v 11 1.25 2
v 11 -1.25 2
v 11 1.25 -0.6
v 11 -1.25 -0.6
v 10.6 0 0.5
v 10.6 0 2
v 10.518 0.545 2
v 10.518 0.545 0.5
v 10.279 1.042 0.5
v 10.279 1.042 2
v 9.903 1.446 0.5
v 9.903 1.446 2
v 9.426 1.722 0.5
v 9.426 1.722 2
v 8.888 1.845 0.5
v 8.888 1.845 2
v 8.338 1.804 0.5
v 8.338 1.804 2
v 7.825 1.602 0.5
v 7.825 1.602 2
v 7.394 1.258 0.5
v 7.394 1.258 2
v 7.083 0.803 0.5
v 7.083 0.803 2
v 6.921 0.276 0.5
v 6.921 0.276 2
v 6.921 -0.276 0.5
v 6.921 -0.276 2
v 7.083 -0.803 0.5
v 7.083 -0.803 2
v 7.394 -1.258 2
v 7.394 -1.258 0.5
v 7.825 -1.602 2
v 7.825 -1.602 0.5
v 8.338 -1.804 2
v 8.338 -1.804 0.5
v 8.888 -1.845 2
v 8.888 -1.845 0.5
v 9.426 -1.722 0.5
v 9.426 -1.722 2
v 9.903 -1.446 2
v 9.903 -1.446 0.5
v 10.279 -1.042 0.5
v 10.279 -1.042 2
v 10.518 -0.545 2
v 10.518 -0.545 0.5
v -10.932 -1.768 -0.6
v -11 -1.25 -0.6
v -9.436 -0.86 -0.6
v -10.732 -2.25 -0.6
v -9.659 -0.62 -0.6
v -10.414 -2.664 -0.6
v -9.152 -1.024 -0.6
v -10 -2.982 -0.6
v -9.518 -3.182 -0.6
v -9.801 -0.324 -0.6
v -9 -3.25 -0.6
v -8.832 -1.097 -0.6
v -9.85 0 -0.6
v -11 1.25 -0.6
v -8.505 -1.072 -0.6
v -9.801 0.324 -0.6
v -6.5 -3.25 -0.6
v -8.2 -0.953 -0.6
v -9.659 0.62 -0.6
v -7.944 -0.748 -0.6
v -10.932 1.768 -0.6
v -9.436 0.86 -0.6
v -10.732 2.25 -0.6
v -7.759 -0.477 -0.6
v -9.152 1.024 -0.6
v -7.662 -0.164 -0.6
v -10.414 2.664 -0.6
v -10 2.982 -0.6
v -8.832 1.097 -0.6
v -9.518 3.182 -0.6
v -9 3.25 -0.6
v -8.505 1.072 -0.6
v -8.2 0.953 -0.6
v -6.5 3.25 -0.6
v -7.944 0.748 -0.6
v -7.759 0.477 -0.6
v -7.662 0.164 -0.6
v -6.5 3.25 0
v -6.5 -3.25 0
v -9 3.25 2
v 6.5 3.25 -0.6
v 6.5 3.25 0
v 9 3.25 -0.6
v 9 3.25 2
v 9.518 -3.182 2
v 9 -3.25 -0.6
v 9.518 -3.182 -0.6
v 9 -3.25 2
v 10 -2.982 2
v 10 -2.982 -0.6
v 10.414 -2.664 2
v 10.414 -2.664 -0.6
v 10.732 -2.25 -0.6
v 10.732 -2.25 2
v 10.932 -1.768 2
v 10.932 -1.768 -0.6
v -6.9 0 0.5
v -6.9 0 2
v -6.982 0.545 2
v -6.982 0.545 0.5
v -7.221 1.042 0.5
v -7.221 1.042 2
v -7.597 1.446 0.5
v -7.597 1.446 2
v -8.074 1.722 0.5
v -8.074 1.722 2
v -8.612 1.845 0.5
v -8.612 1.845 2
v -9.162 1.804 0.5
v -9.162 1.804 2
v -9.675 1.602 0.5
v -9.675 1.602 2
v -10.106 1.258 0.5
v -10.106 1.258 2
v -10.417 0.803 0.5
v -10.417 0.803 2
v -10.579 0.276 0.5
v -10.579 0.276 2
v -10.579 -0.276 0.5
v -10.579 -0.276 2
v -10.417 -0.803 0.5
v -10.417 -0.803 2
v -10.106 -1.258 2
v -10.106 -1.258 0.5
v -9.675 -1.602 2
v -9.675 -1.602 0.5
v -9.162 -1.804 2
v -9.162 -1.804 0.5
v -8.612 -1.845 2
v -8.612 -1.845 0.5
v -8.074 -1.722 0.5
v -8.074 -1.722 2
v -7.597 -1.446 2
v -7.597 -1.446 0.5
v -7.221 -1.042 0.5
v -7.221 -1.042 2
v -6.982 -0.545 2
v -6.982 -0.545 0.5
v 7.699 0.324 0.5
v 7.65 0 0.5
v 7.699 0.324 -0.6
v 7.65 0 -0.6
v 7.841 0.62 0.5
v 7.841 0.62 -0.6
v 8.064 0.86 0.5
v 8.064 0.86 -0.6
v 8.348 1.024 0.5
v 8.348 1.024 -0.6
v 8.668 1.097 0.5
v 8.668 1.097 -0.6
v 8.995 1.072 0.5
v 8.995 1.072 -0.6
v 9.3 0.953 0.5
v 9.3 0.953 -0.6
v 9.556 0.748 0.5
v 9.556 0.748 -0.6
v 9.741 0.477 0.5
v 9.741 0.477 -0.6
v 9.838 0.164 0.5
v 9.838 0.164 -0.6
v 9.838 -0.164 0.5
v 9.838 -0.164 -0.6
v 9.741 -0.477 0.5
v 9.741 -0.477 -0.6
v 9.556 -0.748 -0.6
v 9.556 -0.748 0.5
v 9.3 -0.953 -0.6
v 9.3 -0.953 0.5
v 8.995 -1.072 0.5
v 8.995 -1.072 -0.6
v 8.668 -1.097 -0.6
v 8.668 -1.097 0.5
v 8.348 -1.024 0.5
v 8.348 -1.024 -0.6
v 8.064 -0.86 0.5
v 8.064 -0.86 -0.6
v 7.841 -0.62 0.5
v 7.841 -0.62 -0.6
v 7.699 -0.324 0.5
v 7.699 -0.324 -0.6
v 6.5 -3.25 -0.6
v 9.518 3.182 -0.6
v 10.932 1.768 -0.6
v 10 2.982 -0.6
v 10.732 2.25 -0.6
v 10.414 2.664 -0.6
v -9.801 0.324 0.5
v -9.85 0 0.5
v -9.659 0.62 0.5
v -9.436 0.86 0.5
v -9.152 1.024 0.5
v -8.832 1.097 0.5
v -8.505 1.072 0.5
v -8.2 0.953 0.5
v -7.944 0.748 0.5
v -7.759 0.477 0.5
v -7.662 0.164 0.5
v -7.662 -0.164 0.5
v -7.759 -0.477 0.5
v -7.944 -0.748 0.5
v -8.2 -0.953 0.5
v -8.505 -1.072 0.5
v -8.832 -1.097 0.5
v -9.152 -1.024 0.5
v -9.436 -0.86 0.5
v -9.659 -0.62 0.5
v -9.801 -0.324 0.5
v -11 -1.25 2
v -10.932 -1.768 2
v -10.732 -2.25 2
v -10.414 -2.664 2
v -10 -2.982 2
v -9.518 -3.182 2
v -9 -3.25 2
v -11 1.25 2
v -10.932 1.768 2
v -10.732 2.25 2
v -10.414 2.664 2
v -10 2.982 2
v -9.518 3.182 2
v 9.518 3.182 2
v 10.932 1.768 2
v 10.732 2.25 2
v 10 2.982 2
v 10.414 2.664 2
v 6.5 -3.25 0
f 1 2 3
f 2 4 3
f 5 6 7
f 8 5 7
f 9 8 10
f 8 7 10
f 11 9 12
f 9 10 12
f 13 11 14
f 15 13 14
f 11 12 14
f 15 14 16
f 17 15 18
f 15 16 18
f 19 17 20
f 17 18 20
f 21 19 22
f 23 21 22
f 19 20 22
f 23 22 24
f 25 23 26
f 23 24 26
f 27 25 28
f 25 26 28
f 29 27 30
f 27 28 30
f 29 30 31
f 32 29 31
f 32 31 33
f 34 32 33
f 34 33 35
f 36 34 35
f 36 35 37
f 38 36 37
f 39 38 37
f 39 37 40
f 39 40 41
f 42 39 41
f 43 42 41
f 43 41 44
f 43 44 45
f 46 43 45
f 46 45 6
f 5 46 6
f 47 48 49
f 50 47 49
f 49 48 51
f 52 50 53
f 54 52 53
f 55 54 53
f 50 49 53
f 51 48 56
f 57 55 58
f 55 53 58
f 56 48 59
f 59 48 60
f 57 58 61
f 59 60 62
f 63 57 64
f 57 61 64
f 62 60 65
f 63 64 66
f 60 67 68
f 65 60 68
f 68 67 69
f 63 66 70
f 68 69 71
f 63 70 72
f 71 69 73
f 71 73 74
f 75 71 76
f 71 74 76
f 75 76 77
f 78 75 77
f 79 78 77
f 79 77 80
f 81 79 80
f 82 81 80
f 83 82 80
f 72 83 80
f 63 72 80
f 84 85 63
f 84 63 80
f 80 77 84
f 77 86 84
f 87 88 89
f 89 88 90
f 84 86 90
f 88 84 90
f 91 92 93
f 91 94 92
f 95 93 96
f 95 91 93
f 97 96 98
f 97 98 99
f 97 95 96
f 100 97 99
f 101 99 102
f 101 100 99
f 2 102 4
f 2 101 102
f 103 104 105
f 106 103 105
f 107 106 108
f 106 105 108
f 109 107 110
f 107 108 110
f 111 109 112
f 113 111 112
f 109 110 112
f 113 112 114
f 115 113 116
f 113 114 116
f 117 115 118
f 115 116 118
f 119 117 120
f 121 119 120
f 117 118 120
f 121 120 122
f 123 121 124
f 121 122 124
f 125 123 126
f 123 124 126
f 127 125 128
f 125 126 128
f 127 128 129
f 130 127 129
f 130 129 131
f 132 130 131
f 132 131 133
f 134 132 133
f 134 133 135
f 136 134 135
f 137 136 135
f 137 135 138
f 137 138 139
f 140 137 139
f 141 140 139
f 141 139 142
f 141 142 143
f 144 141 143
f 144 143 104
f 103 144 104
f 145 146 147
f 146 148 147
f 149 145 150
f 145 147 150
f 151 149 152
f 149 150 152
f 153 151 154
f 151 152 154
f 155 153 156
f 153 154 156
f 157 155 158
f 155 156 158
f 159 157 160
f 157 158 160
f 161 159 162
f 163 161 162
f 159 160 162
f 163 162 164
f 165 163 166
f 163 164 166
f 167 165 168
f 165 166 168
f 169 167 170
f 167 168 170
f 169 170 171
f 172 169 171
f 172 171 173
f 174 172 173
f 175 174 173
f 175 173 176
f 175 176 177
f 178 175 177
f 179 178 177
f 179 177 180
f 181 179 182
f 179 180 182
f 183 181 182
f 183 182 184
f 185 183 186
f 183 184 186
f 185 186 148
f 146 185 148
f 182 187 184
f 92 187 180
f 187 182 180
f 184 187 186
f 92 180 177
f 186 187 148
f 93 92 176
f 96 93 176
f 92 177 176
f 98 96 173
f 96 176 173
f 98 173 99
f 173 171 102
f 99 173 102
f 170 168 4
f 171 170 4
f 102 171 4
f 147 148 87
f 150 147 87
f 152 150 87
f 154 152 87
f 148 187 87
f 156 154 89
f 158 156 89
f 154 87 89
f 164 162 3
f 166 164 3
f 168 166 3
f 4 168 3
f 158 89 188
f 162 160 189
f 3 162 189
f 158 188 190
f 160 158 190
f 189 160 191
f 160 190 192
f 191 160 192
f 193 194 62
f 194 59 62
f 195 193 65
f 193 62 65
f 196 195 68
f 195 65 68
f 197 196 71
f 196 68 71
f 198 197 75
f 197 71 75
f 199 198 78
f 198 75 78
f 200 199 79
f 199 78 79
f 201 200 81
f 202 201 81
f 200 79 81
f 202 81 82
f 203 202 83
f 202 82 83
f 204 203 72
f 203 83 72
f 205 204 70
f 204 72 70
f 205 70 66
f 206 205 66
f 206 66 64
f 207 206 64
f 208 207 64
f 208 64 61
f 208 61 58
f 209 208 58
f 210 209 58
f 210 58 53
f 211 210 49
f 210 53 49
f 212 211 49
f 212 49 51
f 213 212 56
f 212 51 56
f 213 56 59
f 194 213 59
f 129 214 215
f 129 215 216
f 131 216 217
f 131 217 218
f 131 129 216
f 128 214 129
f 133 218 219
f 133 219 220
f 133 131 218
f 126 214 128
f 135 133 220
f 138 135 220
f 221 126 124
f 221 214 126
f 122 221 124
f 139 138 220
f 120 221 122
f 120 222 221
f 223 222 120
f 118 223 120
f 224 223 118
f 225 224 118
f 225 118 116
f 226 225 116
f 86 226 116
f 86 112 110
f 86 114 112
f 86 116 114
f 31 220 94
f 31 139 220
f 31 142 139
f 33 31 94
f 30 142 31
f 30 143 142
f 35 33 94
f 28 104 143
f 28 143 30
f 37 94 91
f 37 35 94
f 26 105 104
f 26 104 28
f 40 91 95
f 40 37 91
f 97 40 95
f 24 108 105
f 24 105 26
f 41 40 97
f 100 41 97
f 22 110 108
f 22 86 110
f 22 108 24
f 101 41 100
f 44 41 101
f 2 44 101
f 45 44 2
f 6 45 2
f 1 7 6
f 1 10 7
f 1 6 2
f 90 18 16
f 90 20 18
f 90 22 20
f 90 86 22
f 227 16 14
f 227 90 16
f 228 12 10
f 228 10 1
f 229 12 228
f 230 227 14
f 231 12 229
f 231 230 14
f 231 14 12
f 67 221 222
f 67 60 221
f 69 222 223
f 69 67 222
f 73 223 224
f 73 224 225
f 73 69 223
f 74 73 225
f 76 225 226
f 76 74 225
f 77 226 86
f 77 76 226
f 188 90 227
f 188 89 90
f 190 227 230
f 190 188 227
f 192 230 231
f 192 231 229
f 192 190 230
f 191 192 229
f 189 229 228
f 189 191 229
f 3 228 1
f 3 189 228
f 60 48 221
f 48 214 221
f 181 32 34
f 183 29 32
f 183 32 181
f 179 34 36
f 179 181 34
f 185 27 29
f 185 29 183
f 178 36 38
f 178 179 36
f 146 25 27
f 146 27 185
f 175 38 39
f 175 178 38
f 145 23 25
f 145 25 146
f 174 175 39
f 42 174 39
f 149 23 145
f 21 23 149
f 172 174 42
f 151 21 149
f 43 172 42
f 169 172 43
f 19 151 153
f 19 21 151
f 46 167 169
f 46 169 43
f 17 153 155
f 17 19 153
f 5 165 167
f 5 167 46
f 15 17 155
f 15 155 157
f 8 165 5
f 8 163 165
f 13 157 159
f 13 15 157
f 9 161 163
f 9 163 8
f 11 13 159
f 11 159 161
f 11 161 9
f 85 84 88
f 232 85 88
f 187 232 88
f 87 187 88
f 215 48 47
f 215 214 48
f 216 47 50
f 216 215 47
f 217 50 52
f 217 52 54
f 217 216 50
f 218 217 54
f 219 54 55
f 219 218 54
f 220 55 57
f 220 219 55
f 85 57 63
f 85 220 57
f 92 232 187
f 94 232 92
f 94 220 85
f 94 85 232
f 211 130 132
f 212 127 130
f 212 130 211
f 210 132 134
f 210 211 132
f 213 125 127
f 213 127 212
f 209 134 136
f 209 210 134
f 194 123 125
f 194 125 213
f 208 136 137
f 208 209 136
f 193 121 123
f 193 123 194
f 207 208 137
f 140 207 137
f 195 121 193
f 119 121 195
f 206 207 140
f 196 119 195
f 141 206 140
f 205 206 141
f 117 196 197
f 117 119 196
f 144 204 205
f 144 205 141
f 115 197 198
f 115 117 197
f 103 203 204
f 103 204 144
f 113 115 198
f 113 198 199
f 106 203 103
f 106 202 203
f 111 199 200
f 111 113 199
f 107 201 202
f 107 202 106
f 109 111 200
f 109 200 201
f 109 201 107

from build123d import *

# Parameters (mm, degrees)
F0_W           = 22
F0_H           = 6.5
F1_DEPTH       = 2
F2_W           = 4.5
F2_H           = 6.5
F3_DEPTH       = 0.6
F6_D           = 2.2
F6_CBORE_D     = 3.7
F6_CBORE_DEPTH = 1.5
F7_R           = 2


with BuildPart() as f1:
    # F0 (on Top) → F1 (new body)
    with BuildSketch(Plane.XY):
        Rectangle(F0_W, F0_H)
    extrude(amount=F1_DEPTH)

    # F2 (on Top) → F3 (join)
    with BuildSketch(Plane.XY):
        with Locations((-8.75, 0)):
            Rectangle(F2_W, F2_H)
        with Locations((8.75, 0)):
            Rectangle(F2_W, F2_H)
    extrude(amount=-F3_DEPTH)

    # F6 (through all)
    with Locations(Plane.XY.offset(2)):
        with Locations((-8.75, 0), (8.75, 0)):
            CounterBoreHole(F6_D / 2, F6_CBORE_D / 2, F6_CBORE_DEPTH)

    # F7
    f7_edges = [f1.edges().sort_by_distance(p)[0] for p in [
        (-11, -3.25, 0.7),
        (-11, 3.25, 0.7),
        (11, -3.25, 0.7),
        (11, 3.25, 0.7),
    ]]
    fillet(f7_edges, radius=F7_R)


solid = f1.part
